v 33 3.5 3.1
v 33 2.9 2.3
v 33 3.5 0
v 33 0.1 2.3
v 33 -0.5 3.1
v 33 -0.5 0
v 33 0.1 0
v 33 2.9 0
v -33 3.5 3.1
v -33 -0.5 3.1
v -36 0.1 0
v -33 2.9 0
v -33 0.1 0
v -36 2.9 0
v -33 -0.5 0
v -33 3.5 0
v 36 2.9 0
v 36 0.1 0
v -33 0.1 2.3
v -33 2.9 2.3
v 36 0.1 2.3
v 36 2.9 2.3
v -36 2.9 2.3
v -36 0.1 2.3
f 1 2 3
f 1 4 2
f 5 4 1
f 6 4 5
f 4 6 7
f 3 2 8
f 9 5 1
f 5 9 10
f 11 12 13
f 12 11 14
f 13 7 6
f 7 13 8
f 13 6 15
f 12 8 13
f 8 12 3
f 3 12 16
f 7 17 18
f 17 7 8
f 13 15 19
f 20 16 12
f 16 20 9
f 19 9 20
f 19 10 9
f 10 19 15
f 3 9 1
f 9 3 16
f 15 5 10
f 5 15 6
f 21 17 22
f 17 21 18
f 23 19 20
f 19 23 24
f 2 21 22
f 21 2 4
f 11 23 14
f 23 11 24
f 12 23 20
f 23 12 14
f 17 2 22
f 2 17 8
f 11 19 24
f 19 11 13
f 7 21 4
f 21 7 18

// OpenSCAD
//
// A stand for miniature computer BOSGAME AG40
// One side strut
//

hole_h = 3.0;
hole_w = 2.5;

// Length of the strut between the stands halves (not the pitch).
strut_len = 66.0;

module strut () {
    translate([(strut_len/2)*-1, (1.0/2)*-1, 0])
        cube([strut_len, hole_h + 1.0, hole_w + 0.6]);
    translate([((strut_len + 6.0)/2)*-1, 0.1, 0])
        cube([strut_len + 6.0, hole_h-0.2, hole_w-0.2]);
}

strut();
